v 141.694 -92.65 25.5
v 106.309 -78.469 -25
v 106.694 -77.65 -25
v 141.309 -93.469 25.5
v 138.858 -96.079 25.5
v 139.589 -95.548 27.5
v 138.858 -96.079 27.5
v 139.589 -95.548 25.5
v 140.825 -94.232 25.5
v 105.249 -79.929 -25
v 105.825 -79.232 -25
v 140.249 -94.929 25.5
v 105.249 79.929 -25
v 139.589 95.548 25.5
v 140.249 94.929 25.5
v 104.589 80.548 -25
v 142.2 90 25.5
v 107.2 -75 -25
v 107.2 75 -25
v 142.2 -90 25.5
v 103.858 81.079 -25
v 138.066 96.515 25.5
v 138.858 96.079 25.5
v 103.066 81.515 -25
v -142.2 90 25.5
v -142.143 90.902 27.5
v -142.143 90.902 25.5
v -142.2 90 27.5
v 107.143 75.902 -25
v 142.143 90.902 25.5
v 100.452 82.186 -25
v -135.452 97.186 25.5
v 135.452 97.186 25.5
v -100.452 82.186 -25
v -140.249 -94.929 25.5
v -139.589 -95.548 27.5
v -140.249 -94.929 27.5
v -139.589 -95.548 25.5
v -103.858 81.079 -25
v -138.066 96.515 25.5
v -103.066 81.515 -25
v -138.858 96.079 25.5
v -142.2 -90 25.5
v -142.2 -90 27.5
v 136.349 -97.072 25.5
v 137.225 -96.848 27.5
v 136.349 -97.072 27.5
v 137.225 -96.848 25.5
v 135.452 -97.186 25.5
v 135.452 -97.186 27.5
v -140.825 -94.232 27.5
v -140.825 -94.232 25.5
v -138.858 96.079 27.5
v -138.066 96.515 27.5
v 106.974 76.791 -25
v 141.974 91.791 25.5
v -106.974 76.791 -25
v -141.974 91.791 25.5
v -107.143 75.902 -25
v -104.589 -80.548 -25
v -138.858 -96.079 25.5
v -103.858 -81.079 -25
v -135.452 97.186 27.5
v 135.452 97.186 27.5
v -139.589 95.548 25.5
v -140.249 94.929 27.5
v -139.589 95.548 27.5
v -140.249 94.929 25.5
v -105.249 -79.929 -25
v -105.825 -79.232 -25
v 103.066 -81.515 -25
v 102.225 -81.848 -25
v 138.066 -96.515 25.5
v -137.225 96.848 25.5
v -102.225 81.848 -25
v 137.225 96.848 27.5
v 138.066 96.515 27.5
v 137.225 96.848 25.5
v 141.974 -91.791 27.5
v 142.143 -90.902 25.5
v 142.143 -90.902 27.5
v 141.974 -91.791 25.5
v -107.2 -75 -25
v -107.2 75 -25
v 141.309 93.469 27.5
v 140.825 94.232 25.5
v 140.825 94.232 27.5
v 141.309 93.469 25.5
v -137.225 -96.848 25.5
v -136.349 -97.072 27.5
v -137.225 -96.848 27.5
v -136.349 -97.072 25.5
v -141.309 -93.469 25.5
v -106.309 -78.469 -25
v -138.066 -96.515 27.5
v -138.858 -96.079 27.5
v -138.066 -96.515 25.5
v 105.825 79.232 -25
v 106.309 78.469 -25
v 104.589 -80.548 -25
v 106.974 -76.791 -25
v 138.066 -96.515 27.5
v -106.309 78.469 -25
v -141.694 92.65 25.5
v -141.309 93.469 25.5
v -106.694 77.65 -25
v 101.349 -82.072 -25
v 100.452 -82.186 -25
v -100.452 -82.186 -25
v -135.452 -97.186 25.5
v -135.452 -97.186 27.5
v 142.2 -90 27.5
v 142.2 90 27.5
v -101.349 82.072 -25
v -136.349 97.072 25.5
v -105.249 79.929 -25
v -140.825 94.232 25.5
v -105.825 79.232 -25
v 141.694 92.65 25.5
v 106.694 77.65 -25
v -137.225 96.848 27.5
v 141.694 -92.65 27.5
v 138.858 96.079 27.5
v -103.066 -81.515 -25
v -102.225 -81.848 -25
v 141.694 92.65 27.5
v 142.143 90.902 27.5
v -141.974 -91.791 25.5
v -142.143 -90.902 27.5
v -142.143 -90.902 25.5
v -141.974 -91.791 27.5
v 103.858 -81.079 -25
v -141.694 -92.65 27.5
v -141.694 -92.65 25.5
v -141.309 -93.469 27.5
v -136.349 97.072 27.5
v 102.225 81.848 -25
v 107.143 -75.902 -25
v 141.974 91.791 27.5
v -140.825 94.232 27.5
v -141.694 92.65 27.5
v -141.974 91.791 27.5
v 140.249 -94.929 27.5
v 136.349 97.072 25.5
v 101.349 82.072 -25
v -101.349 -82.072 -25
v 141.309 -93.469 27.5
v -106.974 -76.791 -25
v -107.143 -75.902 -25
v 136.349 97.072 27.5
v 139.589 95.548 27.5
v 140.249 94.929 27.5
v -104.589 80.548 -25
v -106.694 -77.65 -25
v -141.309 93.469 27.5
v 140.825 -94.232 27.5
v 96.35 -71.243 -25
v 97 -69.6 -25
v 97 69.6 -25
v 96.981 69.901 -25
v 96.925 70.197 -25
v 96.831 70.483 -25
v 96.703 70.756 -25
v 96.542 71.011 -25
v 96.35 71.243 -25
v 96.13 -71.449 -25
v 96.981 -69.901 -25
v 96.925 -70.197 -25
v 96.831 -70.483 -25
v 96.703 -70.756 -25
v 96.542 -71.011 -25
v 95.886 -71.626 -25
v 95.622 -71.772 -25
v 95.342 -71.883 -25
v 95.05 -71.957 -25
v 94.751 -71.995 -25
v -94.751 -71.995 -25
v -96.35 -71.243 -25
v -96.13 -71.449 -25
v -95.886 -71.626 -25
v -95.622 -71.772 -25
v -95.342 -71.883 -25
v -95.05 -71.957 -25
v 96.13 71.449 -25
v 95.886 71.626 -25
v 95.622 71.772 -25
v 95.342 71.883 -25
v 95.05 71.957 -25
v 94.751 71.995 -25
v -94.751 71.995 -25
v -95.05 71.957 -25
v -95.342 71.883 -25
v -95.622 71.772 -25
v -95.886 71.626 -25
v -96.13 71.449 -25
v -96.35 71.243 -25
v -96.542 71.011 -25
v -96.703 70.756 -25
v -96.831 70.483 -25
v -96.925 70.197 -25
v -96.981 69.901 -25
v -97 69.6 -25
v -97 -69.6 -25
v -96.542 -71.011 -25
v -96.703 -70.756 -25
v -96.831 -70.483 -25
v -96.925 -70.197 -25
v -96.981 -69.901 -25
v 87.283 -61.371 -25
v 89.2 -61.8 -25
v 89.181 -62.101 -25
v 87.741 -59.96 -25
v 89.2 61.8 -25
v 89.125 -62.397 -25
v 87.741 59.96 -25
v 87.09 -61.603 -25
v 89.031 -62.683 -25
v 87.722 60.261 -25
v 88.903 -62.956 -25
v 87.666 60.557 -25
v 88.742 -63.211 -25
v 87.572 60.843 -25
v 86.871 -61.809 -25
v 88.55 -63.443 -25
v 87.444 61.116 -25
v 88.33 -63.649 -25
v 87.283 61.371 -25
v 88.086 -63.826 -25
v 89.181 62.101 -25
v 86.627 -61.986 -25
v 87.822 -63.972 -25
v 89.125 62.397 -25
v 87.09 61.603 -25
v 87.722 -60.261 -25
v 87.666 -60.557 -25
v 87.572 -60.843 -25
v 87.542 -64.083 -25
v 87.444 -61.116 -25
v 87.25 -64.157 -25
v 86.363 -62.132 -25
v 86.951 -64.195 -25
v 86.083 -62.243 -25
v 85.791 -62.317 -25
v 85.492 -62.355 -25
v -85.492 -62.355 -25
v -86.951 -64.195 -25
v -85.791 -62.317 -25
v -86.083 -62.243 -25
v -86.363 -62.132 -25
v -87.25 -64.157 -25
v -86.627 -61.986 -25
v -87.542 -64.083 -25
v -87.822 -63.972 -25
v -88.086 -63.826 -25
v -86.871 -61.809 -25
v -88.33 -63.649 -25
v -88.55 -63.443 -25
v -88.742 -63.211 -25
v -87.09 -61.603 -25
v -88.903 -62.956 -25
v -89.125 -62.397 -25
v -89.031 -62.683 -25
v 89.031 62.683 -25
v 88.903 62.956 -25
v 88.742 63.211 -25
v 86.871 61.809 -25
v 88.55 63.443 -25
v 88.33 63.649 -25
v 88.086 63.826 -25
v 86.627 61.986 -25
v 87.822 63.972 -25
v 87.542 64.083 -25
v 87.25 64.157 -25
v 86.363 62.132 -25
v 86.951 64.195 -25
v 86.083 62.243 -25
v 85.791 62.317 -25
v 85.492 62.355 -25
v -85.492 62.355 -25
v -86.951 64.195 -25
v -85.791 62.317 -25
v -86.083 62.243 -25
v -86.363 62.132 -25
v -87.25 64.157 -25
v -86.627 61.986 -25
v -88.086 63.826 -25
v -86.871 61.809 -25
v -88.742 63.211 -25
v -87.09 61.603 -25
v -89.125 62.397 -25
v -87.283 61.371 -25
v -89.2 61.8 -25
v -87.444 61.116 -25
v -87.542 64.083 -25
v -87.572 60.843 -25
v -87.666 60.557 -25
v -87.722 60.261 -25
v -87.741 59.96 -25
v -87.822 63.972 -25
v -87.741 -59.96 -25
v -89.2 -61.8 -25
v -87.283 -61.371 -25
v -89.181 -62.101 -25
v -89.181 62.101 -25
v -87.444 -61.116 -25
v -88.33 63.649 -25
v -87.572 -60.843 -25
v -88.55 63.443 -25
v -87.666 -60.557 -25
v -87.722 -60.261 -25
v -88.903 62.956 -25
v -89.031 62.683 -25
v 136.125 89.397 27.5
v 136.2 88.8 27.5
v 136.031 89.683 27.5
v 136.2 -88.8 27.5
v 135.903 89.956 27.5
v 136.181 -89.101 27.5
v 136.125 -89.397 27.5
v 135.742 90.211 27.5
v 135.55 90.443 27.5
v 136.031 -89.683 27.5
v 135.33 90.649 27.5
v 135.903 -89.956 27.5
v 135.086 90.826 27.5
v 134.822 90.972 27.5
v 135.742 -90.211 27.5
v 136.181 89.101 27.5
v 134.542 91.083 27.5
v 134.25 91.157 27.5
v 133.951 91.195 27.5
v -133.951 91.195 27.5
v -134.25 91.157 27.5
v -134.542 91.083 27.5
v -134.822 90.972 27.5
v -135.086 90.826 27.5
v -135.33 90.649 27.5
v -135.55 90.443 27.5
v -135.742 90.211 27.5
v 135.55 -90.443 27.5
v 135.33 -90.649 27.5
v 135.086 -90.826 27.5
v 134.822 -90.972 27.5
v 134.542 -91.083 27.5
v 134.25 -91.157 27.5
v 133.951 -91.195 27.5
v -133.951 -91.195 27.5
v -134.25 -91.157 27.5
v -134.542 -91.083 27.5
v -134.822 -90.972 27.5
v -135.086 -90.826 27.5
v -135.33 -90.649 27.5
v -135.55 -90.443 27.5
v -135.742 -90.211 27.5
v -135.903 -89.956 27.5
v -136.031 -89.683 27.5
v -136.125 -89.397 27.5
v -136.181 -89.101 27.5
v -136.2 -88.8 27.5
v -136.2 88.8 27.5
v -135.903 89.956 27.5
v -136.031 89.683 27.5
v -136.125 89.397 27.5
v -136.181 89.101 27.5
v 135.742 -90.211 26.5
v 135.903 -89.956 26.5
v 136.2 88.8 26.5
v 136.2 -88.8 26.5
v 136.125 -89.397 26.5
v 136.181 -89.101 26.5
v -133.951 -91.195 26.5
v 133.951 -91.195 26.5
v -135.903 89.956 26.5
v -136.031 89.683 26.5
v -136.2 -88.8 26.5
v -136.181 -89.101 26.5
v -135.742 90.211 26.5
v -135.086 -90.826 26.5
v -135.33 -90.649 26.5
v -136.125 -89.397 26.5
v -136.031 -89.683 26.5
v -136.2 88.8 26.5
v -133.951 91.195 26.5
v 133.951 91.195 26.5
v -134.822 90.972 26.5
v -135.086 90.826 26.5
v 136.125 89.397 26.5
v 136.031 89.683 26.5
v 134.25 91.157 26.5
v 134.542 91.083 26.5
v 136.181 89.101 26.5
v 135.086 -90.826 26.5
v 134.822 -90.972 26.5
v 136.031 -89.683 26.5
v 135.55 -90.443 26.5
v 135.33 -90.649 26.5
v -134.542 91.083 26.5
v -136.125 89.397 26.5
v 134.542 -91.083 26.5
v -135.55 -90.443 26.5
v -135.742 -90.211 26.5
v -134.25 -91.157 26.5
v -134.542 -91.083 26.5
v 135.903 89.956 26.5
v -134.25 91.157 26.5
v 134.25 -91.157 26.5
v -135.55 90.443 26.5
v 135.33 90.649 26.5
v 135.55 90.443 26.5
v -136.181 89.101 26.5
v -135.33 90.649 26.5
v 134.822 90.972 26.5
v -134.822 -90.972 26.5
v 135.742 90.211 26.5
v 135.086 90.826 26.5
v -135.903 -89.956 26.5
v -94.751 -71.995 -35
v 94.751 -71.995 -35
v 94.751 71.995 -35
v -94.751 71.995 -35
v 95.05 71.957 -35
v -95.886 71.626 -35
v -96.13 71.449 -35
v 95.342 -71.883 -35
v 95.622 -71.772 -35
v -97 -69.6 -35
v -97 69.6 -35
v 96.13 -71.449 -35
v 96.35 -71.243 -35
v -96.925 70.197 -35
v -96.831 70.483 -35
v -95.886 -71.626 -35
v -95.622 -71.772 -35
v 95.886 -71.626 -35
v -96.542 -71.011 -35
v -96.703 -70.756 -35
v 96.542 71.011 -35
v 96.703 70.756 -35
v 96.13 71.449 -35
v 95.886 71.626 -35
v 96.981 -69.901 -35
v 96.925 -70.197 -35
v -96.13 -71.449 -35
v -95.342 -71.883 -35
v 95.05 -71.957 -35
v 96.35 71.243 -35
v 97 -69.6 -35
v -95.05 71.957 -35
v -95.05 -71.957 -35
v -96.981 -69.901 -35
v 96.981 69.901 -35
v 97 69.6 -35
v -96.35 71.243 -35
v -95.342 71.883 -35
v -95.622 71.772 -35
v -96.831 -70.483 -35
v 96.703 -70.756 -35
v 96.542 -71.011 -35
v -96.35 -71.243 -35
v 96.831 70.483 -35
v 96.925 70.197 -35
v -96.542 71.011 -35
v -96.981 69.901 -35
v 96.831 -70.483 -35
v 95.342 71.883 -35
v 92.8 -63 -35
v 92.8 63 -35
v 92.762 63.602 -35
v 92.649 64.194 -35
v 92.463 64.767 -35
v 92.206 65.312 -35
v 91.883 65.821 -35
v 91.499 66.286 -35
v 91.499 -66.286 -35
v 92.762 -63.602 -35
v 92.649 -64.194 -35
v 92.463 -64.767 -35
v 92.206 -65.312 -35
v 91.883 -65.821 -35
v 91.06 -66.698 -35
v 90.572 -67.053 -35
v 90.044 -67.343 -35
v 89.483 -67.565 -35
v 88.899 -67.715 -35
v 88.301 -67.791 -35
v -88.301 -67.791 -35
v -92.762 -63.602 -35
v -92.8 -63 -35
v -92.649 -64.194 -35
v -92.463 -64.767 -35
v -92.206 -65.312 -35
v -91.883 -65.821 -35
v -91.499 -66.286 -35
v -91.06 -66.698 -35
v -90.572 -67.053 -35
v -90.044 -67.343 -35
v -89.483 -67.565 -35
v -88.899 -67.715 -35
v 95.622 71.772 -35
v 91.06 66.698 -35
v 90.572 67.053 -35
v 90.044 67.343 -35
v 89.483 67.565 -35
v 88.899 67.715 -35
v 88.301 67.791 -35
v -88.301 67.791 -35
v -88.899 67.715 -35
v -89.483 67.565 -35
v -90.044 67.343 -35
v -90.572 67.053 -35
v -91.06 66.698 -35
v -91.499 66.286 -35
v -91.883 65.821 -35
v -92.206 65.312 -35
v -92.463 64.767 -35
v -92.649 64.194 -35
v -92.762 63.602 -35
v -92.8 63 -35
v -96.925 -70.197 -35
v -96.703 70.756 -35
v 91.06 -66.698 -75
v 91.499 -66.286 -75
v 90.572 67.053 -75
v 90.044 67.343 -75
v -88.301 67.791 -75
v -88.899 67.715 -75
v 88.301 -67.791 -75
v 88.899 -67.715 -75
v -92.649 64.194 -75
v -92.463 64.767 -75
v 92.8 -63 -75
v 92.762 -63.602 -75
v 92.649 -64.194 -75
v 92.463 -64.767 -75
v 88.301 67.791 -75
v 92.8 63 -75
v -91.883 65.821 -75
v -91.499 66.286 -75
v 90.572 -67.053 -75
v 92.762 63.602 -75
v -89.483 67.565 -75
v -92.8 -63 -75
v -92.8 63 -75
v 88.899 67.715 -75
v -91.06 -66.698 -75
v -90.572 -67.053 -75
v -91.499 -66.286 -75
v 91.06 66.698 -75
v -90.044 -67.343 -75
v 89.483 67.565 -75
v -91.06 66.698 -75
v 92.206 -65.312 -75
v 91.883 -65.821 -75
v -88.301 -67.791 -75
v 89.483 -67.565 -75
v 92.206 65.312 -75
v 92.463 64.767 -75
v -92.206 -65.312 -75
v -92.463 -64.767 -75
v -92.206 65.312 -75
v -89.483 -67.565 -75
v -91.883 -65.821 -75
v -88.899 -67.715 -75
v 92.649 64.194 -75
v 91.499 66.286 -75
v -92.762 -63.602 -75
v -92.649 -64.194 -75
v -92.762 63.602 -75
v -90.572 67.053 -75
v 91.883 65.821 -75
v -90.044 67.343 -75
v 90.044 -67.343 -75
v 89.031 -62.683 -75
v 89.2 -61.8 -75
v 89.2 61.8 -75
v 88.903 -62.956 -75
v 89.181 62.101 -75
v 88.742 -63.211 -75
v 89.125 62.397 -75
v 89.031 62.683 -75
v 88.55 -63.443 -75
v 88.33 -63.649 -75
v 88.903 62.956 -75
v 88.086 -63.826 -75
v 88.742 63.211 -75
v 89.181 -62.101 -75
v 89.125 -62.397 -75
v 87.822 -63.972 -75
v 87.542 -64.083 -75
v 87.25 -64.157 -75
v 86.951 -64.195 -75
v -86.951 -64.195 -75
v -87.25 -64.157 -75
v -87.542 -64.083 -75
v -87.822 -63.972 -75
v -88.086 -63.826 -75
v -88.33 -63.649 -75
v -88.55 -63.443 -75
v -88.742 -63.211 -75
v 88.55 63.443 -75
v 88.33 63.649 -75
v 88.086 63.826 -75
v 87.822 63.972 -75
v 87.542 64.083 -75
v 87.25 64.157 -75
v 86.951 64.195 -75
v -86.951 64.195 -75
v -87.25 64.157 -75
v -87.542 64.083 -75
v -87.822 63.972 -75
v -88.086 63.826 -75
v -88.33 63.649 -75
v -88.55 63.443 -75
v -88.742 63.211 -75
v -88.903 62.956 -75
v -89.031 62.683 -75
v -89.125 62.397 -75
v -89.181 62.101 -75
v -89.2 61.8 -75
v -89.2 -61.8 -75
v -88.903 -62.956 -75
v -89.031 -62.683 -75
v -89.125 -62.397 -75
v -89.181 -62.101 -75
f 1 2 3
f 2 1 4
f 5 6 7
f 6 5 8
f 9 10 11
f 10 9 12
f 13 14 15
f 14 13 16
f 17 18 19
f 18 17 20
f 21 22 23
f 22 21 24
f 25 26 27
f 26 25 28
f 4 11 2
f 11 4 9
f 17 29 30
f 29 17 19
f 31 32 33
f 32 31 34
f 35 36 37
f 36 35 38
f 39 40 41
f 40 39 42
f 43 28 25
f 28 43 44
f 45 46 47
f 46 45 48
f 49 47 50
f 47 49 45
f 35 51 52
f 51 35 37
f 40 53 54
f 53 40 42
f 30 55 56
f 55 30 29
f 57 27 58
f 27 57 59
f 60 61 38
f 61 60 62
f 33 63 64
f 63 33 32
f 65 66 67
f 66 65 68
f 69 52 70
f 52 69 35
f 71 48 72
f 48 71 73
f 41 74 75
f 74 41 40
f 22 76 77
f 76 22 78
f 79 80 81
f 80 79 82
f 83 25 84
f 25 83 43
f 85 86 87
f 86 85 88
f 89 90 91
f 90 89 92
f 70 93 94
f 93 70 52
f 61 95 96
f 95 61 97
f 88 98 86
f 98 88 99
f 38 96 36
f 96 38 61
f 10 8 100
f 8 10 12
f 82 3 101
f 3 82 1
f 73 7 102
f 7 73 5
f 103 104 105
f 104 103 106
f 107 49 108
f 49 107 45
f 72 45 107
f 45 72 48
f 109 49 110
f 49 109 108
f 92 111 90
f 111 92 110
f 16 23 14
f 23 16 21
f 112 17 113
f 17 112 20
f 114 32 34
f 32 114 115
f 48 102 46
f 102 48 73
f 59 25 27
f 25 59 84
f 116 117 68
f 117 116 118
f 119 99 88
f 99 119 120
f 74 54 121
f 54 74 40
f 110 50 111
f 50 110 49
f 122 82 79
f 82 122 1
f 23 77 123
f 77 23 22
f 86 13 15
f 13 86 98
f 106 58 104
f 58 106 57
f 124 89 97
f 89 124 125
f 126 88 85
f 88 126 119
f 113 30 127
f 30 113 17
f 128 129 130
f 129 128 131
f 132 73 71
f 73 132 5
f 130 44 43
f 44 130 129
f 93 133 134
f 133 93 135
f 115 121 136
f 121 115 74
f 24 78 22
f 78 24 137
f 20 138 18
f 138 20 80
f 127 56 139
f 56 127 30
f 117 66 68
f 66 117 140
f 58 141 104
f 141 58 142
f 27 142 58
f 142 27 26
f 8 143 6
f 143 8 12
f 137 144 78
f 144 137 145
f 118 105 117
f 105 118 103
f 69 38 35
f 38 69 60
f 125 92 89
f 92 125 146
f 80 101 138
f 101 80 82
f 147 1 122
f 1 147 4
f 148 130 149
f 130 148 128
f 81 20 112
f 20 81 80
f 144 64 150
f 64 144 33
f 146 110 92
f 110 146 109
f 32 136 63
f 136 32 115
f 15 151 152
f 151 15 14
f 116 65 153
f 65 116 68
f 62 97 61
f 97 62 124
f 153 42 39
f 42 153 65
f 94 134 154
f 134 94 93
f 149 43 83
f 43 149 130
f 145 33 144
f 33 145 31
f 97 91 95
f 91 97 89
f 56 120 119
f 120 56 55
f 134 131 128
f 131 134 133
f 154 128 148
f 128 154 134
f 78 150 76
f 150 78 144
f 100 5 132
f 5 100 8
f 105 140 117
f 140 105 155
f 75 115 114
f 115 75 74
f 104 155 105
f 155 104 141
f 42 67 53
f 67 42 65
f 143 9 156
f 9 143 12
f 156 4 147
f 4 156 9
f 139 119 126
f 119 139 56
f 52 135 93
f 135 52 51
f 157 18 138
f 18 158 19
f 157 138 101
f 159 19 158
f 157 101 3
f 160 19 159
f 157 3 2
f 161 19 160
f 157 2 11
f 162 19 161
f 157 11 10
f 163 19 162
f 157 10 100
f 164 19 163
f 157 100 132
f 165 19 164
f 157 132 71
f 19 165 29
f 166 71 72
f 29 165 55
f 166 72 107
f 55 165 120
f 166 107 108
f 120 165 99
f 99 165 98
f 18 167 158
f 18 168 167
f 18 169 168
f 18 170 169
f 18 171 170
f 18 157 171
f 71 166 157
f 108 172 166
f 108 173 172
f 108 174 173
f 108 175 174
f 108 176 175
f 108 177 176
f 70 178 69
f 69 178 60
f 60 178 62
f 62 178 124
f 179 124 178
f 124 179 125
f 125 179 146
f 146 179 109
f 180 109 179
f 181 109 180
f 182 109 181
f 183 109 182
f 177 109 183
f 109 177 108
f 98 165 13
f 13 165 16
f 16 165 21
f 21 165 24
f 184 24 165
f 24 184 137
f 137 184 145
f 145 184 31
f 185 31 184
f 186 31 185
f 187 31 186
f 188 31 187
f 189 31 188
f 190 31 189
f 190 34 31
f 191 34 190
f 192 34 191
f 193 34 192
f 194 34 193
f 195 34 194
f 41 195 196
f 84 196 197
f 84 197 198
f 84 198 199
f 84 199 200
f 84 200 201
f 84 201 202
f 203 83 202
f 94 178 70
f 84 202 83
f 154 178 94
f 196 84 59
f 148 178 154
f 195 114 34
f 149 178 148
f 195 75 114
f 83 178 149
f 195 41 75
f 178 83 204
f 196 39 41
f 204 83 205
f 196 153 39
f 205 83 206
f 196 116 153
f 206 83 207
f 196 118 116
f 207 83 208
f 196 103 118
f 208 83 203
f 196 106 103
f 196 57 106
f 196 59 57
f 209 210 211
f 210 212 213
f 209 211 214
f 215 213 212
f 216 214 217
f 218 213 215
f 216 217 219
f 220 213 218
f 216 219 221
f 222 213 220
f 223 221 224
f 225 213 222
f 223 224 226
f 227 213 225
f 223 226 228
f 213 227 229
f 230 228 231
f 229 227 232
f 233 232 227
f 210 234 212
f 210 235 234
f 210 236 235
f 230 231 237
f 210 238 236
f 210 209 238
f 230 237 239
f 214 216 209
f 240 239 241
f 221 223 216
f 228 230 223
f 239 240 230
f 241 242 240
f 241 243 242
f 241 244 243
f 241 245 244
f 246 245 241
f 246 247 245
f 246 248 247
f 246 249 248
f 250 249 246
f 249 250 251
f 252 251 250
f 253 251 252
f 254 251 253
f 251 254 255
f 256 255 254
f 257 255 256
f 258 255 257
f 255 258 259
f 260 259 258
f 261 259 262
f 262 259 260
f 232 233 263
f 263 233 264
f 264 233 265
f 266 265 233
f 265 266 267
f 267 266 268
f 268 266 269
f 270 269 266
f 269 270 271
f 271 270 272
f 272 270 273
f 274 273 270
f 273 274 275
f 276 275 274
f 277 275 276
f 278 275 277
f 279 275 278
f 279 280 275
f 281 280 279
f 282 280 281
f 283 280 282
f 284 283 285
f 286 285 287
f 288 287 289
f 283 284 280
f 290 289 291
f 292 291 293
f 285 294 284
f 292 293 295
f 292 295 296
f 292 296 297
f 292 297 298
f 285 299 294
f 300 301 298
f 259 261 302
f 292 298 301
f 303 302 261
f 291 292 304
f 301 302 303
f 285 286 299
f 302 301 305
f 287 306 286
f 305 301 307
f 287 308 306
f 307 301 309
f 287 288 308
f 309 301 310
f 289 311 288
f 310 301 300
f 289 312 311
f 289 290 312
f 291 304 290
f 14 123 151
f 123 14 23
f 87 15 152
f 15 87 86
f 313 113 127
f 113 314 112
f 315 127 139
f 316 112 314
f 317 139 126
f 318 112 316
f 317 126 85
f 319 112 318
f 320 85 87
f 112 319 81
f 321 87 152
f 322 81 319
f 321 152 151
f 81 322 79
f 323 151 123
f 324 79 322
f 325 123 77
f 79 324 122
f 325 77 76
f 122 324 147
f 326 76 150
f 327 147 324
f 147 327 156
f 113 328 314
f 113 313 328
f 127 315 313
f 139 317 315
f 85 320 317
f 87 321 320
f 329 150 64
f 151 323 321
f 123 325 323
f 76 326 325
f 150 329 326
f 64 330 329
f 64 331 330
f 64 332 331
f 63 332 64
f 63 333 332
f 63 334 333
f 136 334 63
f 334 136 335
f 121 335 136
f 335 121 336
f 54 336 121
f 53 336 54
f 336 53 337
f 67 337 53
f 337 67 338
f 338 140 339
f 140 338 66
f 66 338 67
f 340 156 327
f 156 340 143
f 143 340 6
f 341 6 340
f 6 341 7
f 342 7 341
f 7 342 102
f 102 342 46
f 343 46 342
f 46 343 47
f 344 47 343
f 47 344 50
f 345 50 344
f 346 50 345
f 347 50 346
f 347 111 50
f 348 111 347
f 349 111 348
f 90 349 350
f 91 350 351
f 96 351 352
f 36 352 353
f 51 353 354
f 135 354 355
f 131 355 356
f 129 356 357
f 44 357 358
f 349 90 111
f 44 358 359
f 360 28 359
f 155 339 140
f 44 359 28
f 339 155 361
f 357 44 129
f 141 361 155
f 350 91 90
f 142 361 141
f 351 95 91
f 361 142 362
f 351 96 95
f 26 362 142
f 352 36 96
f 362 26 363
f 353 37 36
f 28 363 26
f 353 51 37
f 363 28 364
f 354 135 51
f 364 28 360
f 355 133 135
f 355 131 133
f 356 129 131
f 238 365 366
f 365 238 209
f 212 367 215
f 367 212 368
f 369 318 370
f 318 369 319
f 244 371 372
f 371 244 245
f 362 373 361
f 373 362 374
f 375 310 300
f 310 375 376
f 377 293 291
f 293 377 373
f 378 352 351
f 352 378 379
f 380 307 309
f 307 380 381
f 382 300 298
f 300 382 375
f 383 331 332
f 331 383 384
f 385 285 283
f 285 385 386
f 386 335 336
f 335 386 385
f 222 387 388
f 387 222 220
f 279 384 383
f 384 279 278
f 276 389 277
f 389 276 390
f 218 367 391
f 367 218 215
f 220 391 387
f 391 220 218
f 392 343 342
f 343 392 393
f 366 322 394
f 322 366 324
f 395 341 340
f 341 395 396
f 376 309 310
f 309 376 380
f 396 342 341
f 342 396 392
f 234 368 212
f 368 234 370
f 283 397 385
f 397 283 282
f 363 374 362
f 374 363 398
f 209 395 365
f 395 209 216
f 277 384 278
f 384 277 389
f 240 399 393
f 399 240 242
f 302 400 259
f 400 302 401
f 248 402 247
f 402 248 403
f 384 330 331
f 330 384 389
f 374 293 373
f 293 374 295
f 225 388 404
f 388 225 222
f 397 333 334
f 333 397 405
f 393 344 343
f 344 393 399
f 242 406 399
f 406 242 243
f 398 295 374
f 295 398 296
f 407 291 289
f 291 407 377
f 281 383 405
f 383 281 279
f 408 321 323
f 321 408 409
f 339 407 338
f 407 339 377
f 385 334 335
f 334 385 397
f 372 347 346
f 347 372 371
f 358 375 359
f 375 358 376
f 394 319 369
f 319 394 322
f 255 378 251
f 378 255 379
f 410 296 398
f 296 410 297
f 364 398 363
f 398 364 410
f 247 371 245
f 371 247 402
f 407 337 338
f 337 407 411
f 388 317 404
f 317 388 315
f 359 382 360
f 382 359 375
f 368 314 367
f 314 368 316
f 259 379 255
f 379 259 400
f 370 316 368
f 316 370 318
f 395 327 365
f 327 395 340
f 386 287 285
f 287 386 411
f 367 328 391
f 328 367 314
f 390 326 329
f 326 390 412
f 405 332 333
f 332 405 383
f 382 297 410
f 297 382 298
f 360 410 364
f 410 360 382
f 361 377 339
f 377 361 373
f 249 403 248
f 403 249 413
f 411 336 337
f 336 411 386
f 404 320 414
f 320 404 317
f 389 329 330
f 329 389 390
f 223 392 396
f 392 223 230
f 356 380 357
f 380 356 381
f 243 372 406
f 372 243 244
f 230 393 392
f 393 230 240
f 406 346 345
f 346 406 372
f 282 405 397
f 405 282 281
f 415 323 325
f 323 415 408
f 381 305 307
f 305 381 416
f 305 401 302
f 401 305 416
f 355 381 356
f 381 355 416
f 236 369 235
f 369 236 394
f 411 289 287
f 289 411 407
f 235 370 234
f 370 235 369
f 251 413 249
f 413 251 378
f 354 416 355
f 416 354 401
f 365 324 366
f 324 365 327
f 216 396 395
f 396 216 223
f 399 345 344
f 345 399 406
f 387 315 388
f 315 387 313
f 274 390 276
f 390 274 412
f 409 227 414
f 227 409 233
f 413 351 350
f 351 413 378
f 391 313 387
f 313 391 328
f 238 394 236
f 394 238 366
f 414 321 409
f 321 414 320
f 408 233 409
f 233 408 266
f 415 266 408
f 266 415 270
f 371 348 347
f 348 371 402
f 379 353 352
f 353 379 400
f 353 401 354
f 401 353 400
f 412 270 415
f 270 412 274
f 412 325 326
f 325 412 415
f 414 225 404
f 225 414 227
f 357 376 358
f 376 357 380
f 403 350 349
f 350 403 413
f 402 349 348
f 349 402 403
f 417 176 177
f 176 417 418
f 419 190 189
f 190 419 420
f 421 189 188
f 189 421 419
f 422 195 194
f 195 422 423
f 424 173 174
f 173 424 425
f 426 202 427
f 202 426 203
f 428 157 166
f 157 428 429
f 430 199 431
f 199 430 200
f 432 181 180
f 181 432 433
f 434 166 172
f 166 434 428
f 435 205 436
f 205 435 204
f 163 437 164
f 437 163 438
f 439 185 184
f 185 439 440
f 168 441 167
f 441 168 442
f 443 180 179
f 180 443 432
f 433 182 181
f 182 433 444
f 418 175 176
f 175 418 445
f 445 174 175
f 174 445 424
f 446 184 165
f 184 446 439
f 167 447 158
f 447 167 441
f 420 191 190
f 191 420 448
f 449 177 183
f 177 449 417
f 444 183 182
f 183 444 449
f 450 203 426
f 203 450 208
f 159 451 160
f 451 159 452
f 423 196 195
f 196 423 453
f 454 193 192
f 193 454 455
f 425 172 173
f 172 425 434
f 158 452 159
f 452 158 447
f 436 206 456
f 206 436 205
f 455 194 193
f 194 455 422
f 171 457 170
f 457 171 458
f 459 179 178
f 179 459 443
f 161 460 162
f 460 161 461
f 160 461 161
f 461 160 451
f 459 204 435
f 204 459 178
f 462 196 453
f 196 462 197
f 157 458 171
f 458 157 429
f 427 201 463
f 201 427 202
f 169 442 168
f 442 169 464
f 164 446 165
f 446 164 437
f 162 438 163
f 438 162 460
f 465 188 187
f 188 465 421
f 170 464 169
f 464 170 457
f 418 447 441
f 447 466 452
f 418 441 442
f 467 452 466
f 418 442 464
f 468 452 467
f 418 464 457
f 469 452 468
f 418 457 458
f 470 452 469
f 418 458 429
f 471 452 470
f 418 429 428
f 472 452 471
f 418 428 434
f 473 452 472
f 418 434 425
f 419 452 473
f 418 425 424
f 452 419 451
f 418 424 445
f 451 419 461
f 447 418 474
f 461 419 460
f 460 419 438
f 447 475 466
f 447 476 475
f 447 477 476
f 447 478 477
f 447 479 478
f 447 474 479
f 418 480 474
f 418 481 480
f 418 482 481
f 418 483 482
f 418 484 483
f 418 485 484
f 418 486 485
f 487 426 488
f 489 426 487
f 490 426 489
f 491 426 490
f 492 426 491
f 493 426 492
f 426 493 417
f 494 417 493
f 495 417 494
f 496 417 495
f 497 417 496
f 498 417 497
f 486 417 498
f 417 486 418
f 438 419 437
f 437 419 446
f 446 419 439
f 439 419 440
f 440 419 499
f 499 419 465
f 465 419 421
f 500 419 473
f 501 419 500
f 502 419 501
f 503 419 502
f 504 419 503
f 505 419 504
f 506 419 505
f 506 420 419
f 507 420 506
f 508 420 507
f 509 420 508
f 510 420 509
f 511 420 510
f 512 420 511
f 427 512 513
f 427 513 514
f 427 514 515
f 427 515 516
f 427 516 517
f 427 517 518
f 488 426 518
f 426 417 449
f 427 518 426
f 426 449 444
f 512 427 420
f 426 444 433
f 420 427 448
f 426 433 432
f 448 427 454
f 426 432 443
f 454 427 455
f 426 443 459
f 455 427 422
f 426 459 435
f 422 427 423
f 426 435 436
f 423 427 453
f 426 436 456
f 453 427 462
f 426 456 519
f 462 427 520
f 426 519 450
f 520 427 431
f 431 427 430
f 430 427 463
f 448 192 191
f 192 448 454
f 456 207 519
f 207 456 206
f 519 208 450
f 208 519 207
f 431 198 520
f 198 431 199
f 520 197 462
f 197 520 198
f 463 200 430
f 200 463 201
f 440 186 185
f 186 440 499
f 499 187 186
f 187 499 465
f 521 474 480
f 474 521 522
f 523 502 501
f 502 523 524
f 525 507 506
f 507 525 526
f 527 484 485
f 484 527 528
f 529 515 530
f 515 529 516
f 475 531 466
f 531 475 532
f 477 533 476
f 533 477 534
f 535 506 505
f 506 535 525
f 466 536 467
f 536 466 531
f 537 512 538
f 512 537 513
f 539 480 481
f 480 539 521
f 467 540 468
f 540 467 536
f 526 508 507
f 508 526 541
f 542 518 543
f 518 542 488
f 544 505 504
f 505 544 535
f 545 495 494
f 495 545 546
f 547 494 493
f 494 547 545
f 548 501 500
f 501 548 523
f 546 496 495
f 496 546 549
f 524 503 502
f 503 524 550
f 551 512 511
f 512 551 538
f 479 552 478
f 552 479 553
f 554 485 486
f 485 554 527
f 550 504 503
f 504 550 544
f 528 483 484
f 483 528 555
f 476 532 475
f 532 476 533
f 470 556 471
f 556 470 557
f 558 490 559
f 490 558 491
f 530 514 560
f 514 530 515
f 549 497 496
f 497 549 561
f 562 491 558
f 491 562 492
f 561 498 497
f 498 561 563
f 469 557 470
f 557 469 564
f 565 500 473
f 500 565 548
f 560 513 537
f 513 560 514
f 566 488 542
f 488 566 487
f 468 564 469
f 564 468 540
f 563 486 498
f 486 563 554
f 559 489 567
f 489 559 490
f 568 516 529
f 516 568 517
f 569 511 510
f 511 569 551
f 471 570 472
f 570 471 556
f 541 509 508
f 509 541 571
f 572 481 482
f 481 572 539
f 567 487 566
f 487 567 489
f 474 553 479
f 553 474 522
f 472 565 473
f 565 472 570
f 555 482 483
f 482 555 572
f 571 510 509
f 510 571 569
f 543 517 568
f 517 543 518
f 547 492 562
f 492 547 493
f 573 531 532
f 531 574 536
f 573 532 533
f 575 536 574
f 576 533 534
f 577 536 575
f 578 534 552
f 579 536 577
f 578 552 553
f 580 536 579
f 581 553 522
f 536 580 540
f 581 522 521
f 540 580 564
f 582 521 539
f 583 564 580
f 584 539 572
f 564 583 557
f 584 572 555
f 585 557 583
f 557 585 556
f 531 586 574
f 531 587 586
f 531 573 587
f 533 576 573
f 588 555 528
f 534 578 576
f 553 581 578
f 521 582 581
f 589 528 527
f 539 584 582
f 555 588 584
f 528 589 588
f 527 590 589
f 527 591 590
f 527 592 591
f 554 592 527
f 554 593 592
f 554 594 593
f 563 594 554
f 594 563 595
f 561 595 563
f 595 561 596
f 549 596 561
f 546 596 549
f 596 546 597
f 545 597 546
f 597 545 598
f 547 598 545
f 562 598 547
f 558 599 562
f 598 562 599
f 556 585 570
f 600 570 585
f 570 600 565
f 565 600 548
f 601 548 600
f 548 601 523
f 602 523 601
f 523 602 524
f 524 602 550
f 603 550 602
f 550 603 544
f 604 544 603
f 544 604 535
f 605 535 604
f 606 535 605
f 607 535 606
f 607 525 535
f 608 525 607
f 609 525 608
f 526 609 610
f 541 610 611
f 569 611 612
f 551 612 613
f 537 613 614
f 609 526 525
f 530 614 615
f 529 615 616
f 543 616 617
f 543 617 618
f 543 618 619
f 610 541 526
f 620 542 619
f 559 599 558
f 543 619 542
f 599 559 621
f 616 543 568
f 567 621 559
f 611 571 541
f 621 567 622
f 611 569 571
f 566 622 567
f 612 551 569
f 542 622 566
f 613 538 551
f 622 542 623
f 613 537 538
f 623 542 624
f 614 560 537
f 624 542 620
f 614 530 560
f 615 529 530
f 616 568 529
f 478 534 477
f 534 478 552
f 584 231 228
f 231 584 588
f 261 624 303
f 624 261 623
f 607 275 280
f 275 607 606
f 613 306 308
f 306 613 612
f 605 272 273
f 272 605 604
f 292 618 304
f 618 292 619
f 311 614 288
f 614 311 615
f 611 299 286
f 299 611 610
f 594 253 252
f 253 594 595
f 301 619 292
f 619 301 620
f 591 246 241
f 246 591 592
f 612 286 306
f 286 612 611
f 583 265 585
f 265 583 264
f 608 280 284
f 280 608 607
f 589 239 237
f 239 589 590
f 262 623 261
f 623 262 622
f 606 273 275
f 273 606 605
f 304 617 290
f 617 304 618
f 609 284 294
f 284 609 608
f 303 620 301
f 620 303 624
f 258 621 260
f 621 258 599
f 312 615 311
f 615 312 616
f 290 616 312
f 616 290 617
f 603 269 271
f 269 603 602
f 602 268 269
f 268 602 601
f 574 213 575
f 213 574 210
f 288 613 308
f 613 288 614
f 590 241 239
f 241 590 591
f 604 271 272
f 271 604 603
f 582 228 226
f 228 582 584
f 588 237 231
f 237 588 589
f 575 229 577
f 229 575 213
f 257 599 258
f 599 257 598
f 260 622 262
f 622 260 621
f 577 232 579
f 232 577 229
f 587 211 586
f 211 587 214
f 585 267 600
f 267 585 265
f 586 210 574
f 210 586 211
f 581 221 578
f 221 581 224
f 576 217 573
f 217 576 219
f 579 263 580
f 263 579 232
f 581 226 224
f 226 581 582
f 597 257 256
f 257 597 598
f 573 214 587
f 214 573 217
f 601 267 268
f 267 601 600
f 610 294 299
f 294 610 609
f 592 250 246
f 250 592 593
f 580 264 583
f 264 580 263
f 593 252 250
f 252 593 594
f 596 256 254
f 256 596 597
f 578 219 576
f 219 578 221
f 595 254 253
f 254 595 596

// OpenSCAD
$fn=50;
//$fn=100;
//$fn=4;

//use <roundedcube.scad>

// 5.985 liters (7l bag)
bag_x = 190;
bag_y = 140;
bag_z = 225;

nozzle = 0.6;
//r=0.5;
//r=1.5;
//r=1;
thickness = nozzle*4;
//thickness = nozzle*6;
r=thickness;
r2=r+thickness;
r3=r2+thickness;
//r=4;
center = true;
fitting_tollerance = 1.2;

bag_plus = 10;
base_x = bag_x+bag_plus;
base_y = bag_y+bag_plus;
bottom_z = 5+bag_plus;

funnel_x = bag_x+80;
funnel_y = bag_y+40;

middle_z = bag_z;

funnel_z = 26; // [10:100]
top_inlay_z = 50;

middle_part_offset_delta = 20; // [1:60]
top_part_offset_delta = 150; // [50:250]

module minkowski_spehere(r) {
    minkowski() {
        children();
        cylinder(r=r);
//           sphere(r);
    }
}

// kontroll objekt
module bag() {
    translate([0, 0, -10])
        cube([bag_x, bag_y, bag_z], center);
}

module base() {
    z = bottom_z;
    minkowski_spehere(r3)
    cube([base_x, base_y, z], center);

}

module inlay(factor=1, z, tollerance=0) {
    x = (base_x-thickness*factor) - tollerance;
    y = (base_y-thickness*factor) - tollerance;

    cube([x, y, z], center);
}

module bottom_inlay(tollerance=0) {
    translate([0, 0, thickness*2])
        minkowski_spehere(r2)
        inlay(1, bottom_z, tollerance);

}

module top_inlay(factor=1, r=r) {
    //    translate([0, 0, 1])

    minkowski_spehere(r)
    inlay(factor, top_inlay_z);
}

// bottom part
module bottom() {
    difference() {
        base();
        bottom_inlay();
    }
}

// Example usage of the module
module middle() {

    // Parameters
    trashbin_height = middle_z-25;  // Height of the trashbin
    trashbin_diameter = 150; // Diameter of the trashbin
    hole_diameter = 10; // Diameter of the holes
    hex_radius = 10; // Radius of the hexagons
    z_spacing = 8; // Spacing between layers in the Z direction

    // Calculate max values for loops
    max_i = trashbin_diameter / 2 - hex_radius;
    max_j = trashbin_diameter / 2 - hex_radius;
    max_z = trashbin_height;

    offset = (middle_z / 2) + bottom_z / 2;

    difference() {
        group() {
            translate([0, 0, -offset])
                bottom_inlay(fitting_tollerance);

            minkowski_spehere(r3)
            cube([base_x, base_y, middle_z], true);
        }

        // hole
        minkowski_spehere(r)
        inlay(4, middle_z+offset);
    }

}

module funnel() {
    adapter_factor = 10;

    // funnel

    difference() {
        hull() {
            translate([0, 0, funnel_z])
                minkowski_spehere(r3)
                cube([funnel_x, funnel_y, 1], true);

            translate([0, 0, 0])
                top_inlay(0, r3);

        }

        // hole
        hull() {
            translate([0, 0, funnel_z+1])
                minkowski_spehere(r)
                cube([funnel_x-thickness, funnel_y-thickness, 1], true);

            translate([0, 0, -1])
                top_inlay(adapter_factor+3);

        }
    }

    // fitting lip

    // adapter
    translate([0, 0, -top_inlay_z])
        difference() {
            group() {
                // fitting lip
                top_inlay_lip = 10;
                translate([0, 0, top_inlay_z/2-top_inlay_lip/2])
                    minkowski_spehere(r)
                    inlay(4, top_inlay_lip, fitting_tollerance);

                // inner funnel

                minkowski_spehere(r2)
                inlay(adapter_factor, top_inlay_z);
            }

            // hole
            translate([0, 0, 1])
                minkowski_spehere(r)
                inlay(adapter_factor+1, top_inlay_z+thickness+2);

        }
}



// ===

// kontroll objekt
//#translate([0, 0, -6])
//cube([100, 100, thickness], true);

//import_stl("corner.stl");
//roundedcube([base_x, base_y, bag_z], center=true, radius=r);

//bottom();

//middle_part_offset = middle_z/2+middle_part_offset_delta;
//translate([0, 0, middle_part_offset ]) {
////    #bag();
//    middle();
//}
////
////// top
//top_part_offset = middle_part_offset + top_part_offset_delta;
//translate([0, 0, top_part_offset ])
funnel();
